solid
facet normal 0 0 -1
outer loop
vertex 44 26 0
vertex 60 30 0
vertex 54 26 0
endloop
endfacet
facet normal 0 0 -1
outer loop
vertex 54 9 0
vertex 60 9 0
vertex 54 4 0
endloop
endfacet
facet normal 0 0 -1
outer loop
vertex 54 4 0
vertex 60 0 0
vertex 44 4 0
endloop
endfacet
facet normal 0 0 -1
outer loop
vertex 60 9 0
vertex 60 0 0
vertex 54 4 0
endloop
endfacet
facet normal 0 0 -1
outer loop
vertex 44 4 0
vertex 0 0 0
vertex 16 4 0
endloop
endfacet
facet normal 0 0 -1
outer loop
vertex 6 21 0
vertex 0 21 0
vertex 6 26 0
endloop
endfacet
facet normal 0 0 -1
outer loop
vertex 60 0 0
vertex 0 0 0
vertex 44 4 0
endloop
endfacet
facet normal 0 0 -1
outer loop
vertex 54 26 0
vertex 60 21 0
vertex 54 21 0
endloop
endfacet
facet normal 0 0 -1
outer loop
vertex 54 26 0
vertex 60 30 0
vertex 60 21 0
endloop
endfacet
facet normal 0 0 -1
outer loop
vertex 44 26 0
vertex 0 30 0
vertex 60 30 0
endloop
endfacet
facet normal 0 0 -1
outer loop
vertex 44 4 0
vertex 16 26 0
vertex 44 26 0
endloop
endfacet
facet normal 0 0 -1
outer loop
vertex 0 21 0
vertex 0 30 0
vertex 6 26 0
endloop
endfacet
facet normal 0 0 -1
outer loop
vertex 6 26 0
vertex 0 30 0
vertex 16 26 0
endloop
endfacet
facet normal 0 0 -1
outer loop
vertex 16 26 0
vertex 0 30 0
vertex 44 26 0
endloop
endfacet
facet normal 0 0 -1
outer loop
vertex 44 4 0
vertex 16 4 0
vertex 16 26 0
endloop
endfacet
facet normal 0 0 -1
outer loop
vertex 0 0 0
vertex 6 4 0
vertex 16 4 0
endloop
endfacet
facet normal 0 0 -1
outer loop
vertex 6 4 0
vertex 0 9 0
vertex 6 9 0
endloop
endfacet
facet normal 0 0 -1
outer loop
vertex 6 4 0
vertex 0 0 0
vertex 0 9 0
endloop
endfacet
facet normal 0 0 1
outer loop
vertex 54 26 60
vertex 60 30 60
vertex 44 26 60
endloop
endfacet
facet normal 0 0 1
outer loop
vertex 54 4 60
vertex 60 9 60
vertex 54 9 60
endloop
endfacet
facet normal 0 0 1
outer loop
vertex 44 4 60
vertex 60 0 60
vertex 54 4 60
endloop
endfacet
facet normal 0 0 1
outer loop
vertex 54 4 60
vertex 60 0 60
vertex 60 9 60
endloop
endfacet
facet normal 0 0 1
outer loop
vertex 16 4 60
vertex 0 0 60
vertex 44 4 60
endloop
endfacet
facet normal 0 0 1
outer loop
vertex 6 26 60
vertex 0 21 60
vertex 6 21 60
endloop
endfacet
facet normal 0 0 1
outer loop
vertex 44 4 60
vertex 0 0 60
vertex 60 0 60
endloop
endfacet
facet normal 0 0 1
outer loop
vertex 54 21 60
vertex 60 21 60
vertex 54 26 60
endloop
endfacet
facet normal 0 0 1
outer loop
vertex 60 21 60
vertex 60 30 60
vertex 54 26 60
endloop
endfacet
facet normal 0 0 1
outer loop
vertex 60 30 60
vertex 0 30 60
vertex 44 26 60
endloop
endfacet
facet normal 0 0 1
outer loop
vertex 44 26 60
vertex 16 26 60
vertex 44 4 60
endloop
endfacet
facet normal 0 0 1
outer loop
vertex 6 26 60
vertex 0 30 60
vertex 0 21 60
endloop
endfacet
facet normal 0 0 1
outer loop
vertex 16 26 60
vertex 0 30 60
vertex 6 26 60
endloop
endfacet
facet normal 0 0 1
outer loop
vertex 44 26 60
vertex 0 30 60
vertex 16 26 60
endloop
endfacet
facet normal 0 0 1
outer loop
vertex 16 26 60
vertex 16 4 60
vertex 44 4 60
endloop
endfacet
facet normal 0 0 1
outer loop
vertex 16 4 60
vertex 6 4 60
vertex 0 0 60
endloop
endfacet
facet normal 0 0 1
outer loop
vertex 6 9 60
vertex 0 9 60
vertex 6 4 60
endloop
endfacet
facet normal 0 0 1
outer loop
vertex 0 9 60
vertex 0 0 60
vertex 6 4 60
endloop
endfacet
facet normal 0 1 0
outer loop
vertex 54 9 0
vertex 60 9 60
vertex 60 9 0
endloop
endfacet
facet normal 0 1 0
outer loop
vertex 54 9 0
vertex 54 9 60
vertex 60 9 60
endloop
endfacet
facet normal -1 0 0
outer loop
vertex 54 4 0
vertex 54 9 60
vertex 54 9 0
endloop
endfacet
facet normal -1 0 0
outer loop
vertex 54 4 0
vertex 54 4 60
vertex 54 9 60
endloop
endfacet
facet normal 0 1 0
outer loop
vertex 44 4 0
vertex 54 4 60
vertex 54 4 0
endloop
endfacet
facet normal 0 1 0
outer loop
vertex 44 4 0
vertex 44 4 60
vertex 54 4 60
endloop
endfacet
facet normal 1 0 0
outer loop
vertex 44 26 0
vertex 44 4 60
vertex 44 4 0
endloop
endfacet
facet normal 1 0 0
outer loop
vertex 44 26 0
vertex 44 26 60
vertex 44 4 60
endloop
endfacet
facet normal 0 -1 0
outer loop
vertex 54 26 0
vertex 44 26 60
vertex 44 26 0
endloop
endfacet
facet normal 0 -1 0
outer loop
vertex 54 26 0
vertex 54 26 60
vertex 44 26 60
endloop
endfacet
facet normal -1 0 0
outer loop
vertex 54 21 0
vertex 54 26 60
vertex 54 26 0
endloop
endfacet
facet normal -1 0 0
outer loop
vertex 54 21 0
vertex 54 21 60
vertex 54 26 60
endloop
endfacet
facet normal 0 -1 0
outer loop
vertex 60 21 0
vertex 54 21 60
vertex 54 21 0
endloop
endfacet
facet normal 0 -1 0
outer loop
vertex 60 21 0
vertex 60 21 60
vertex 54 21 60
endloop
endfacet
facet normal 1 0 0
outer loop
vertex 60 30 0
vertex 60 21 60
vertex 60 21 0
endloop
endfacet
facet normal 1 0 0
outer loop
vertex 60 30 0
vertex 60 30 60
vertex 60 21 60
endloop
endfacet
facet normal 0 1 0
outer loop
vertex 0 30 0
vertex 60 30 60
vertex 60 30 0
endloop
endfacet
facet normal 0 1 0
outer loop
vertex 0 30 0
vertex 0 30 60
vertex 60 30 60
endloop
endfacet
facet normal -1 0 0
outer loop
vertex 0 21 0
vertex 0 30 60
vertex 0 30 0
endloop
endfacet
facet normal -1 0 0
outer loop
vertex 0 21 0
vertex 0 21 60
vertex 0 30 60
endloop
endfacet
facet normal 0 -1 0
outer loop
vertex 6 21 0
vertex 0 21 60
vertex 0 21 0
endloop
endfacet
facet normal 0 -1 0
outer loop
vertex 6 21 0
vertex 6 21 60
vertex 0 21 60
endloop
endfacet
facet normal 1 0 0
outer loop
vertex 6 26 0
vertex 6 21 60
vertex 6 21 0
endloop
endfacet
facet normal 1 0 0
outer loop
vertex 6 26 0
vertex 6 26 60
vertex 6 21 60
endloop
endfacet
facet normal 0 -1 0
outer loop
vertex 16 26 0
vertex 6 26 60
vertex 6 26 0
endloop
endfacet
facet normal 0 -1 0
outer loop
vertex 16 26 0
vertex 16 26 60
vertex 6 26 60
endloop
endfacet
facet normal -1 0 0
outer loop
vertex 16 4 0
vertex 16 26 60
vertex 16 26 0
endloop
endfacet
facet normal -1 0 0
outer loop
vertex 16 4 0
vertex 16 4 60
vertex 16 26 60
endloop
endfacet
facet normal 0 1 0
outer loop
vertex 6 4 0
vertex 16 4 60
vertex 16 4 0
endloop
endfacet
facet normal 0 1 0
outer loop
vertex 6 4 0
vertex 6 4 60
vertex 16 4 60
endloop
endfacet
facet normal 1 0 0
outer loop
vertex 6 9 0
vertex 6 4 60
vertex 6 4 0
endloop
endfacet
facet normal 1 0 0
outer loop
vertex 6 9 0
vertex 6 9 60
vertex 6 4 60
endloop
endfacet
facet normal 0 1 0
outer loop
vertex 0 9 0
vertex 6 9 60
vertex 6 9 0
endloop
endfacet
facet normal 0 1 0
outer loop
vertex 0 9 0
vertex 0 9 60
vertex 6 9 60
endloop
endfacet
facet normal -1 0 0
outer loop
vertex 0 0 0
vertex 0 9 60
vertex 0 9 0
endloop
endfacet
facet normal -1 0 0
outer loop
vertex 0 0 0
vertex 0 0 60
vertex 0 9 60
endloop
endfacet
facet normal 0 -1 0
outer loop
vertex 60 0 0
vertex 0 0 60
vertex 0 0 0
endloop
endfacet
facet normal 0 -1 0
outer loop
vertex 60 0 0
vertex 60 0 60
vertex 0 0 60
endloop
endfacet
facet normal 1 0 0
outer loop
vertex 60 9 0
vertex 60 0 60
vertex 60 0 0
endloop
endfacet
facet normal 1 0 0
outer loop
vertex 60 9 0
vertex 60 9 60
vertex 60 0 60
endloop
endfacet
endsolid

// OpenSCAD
$fn = 32;

// ----------------------------------------------------------------------
// T-slot rail: 60 x 30 mm section, 60 mm long
// ----------------------------------------------------------------------

// --- parameters (mm) ---
profile_height = 60;      // extrusion height
profile_points = 20;      // points of the closed outline

profile = [[0, 0], [60, 0], [60, 9], [54, 9], [54, 4], [44, 4], [44, 26], [54, 26], [54, 21], [60, 21], [60, 30], [0, 30], [0, 21], [6, 21], [6, 26], [16, 26], [16, 4], [6, 4], [6, 9], [0, 9]];  // single closed polygon, 20 points, counter clockwise

// --- the one profile operation ---
linear_extrude(height = profile_height) polygon(points = profile);
